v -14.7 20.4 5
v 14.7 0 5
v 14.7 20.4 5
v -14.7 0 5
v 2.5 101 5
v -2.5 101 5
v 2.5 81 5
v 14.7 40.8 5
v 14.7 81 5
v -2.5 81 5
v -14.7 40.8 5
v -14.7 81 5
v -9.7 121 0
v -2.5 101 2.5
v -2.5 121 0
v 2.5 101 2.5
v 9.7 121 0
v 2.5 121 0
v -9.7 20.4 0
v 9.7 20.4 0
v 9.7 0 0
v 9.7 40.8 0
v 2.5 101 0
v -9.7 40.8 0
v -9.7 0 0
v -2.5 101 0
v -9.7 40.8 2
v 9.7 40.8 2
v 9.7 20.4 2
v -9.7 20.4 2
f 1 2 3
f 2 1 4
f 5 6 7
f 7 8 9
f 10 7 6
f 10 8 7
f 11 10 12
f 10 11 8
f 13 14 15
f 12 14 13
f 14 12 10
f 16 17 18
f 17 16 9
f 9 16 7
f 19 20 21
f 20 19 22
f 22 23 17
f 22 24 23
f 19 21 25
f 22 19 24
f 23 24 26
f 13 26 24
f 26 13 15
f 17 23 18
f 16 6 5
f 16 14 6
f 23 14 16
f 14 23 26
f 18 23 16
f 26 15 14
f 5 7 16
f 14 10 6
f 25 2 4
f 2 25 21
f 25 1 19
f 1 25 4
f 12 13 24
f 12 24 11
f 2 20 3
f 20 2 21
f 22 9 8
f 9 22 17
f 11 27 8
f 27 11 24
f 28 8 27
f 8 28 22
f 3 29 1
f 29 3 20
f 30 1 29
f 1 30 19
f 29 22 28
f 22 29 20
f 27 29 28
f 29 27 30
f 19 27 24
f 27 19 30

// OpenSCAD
// file: trapezoid.scad
/*
CC BY-SA 3.0
https://www.thingiverse.com/thing:220868
Trapezoid
	Create a Basic Trapezoid (Based on Isosceles_Triangle)

            d
          /----\
         /  |   \
     a  /   H    \ c
       /    |     \
 angle ------------ angle
            b

	b: Length of side b
	angle: Angle at points angleAB & angleBC
	H: The 2D height at which the triangle should be cut to create the trapezoid
	heights: If vector of size 3 (Standard for triangles) both cd & da will be the same height, if vector have 4 values [ab,bc,cd,da] than each point can have different heights.
*/
module Trapezoid(
			b, angle=60, H, height=1, heights=undef,
			center=undef, centerXYZ=[true,false,false])
{
	validAngle = (angle < 90);
	adX = H / tan(angle);

	// Calculate Heights at each point
	heightAB = ((heights==undef) ? height : heights[0])/2;
	heightBC = ((heights==undef) ? height : heights[1])/2;
	heightCD = ((heights==undef) ? height : heights[2])/2;
	heightDA = ((heights==undef) ? height : ((len(heights) > 3)?heights[3]:heights[2]))/2;

	// Centers
	centerX = (center || (center==undef && centerXYZ[0]))?0:b/2;
	centerY = (center || (center==undef && centerXYZ[1]))?0:H/2;
	centerZ = (center || (center==undef && centerXYZ[2]))?0:max(heightAB,heightBC,heightCD,heightDA);

	// Points
	y = H/2;
	bx = b/2;
	dx = (b-(adX*2))/2;

	pointAB1 = [centerX-bx, centerY-y, centerZ-heightAB];
	pointAB2 = [centerX-bx, centerY-y, centerZ+heightAB];
	pointBC1 = [centerX+bx, centerY-y, centerZ-heightBC];
	pointBC2 = [centerX+bx, centerY-y, centerZ+heightBC];
	pointCD1 = [centerX+dx, centerY+y, centerZ-heightCD];
	pointCD2 = [centerX+dx, centerY+y, centerZ+heightCD];
	pointDA1 = [centerX-dx, centerY+y, centerZ-heightDA];
	pointDA2 = [centerX-dx, centerY+y, centerZ+heightDA];

	validH = (adX < b/2);

	if (validAngle && validH)
	{
		polyhedron(
			points=[	pointAB1, pointBC1, pointCD1, pointDA1,
						pointAB2, pointBC2, pointCD2, pointDA2 ],
			faces=[	
				[0, 1, 2],
				[0, 2, 3],
				[4, 6, 5],
				[4, 7, 6],
				[0, 4, 1],
				[1, 4, 5],
				[1, 5, 2],
				[2, 5, 6],
				[2, 6, 3],
				[3, 6, 7],
				[3, 7, 0],
				[0, 7, 4]	] );
	} else {
		if (!validAngle) echo("Trapezoid invalid, angle must be less than 90");
		else echo("Trapezoid invalid, H is larger than triangle");
	}
}
// main file
use <./trapezoid.scad>
tolerance=0.98; // used as multiplicator. 0.1=10%, 0.9=90%
sum_length=298;
// make sure to account for wedge length. so length of part must be +wedge_length long
total_length=161;
wedge_length=40;
slider_width=20;

// put rail for permanent spool and put in dent for insertion of sliders. --_--- instead of -----
initial_spool=true;
// put wedge on right side
wedge_right=true;
wedge_left=false;

assert(wedge_left != initial_spool, "You can only have the initial spool bit or a wedge on the left, not both at once!");

function value_if(condition, value) = condition ? value : 0;

module wedge(length, width, height) {
    difference() {
        cube([length,width,height]);
        rotate([0,-atan(height/length),0]) translate([0,-0.1,0]) cube([length*1.5,width+1,height+1]);
    };
}
// wedge(100,30,5);

module connector(length, width, height) {
    difference() {
        union() {
            wedge(length, width, height);
            translate([length-length/2,(width-height)/2,0]) cube([length/2,height,height]);
        }
        translate([0,(width-height)/2,0]) cube([length/2,height,height]);
    }
}
// connector(40,30,5);

module rail(initial_spool=initial_spool, wedge_right=wedge_right, wedge_left=wedge_left, total_length=total_length, rail_width=30, rail_height=5) {
    l = value_if(wedge_right, wedge_length) + value_if(wedge_left, wedge_length) + value_if(initial_spool, 2*slider_width);
    echo("Min length l=", l);
    assert(total_length > l, "Rail too short!");
    
    actual_width=rail_width*tolerance;
    short_side=actual_width-2*(rail_height*cos(45))/sqrt(1-pow(cos(45),2));
    difference() {
        translate([0,0,rail_height]) rotate([-90,0,0]) Trapezoid(b=actual_width,angle=45,H=rail_height,height=total_length);
        
        // remove rail for area for inserting sliders
        if (initial_spool) {
            w = slider_width*(2-tolerance);
            translate([-20,w,-1]) cube([50,w, 30]);
        }
        if (wedge_right) {
            translate([-rail_width/2,total_length-wedge_length,rail_height]) rotate([0,180,-90]) connector(wedge_length,rail_width,rail_height);
        }
        if (wedge_left) {
            translate([-rail_width/2,wedge_length,0]) rotate([0,0,-90]) connector(wedge_length,rail_width,rail_height);
        }
    }
    
    // add support back in
    if (initial_spool) {
        translate([-short_side/2,slider_width,0]) cube([short_side,slider_width+10, 2]);
    };
};
rail(wedge_left=false, initial_spool=true, wedge_right=true, total_length=81+40);
// translate([0,100,0]) 
// rail(wedge_left=true, initial_spool=false, wedge_right=false, total_length=length);
